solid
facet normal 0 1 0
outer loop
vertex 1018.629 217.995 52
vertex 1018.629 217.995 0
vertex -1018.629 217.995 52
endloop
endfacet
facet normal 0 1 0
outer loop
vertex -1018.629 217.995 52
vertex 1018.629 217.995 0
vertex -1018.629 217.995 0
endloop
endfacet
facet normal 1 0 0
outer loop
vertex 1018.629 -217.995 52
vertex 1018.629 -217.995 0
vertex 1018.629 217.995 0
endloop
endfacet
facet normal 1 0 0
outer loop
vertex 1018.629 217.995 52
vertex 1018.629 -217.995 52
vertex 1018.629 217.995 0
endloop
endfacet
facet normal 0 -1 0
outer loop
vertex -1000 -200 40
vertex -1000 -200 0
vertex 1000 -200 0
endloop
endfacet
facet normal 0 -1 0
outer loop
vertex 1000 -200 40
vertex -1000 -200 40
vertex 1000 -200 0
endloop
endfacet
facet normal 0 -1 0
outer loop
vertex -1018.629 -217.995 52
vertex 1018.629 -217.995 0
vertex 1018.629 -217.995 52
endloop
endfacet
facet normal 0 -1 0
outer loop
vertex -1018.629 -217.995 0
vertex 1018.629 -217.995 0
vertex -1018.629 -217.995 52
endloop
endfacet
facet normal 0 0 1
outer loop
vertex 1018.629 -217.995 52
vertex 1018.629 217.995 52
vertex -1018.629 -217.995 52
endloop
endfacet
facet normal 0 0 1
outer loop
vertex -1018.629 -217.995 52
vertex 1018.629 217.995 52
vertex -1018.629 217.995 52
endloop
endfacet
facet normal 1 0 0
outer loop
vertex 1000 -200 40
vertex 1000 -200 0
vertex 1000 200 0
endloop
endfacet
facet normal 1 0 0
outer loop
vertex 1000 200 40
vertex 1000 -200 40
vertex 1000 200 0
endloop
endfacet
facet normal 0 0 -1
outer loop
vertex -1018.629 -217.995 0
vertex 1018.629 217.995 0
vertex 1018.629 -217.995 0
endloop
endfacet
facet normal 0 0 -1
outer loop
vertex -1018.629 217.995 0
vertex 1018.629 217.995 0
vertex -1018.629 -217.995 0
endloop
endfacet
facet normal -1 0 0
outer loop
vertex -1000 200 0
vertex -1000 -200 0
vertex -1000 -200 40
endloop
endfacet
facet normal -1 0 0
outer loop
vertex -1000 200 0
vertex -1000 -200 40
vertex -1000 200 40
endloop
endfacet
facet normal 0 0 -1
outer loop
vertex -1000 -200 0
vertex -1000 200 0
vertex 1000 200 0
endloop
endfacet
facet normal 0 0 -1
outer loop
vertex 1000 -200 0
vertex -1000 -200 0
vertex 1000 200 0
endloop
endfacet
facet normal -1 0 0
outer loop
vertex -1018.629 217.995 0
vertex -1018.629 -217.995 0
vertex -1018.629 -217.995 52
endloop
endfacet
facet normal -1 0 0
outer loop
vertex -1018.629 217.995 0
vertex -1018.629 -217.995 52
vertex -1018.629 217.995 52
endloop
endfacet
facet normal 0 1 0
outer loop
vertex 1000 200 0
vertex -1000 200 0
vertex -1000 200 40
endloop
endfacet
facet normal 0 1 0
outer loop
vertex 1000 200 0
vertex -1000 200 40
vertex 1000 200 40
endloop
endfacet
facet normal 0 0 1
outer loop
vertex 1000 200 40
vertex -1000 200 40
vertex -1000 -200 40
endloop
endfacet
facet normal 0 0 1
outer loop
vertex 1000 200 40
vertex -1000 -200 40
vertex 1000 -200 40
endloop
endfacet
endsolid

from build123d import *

# Parameters (mm, degrees)
SCHIZZO1_W                   = 2000
SCHIZZO1_H                   = 400
ESTRUSIONE_ESTRUSIONE1_DEPTH = 40
SCHIZZO2_W                   = 2037.257507086
SCHIZZO2_H                   = 435.989192526
ESTRUSIONE_ESTRUSIONE2_DEPTH = 52


with BuildPart() as part:
    # Schizzo1 → Estrusione-Estrusione1 (new body)
    with BuildSketch(Plane.XY):
        Rectangle(SCHIZZO1_W, SCHIZZO1_H)
    extrude(amount=ESTRUSIONE_ESTRUSIONE1_DEPTH)


with BuildPart() as body_2:
    # Schizzo2 → Estrusione-Estrusione2 (new body)
    with BuildSketch(Plane(origin=(0, 0, 0), x_dir=(-1, 0, 0), z_dir=(0, 0, -1))):
        Rectangle(SCHIZZO2_W, SCHIZZO2_H)
    extrude(amount=-ESTRUSIONE_ESTRUSIONE2_DEPTH)


solid = Compound([part.part, body_2.part])
